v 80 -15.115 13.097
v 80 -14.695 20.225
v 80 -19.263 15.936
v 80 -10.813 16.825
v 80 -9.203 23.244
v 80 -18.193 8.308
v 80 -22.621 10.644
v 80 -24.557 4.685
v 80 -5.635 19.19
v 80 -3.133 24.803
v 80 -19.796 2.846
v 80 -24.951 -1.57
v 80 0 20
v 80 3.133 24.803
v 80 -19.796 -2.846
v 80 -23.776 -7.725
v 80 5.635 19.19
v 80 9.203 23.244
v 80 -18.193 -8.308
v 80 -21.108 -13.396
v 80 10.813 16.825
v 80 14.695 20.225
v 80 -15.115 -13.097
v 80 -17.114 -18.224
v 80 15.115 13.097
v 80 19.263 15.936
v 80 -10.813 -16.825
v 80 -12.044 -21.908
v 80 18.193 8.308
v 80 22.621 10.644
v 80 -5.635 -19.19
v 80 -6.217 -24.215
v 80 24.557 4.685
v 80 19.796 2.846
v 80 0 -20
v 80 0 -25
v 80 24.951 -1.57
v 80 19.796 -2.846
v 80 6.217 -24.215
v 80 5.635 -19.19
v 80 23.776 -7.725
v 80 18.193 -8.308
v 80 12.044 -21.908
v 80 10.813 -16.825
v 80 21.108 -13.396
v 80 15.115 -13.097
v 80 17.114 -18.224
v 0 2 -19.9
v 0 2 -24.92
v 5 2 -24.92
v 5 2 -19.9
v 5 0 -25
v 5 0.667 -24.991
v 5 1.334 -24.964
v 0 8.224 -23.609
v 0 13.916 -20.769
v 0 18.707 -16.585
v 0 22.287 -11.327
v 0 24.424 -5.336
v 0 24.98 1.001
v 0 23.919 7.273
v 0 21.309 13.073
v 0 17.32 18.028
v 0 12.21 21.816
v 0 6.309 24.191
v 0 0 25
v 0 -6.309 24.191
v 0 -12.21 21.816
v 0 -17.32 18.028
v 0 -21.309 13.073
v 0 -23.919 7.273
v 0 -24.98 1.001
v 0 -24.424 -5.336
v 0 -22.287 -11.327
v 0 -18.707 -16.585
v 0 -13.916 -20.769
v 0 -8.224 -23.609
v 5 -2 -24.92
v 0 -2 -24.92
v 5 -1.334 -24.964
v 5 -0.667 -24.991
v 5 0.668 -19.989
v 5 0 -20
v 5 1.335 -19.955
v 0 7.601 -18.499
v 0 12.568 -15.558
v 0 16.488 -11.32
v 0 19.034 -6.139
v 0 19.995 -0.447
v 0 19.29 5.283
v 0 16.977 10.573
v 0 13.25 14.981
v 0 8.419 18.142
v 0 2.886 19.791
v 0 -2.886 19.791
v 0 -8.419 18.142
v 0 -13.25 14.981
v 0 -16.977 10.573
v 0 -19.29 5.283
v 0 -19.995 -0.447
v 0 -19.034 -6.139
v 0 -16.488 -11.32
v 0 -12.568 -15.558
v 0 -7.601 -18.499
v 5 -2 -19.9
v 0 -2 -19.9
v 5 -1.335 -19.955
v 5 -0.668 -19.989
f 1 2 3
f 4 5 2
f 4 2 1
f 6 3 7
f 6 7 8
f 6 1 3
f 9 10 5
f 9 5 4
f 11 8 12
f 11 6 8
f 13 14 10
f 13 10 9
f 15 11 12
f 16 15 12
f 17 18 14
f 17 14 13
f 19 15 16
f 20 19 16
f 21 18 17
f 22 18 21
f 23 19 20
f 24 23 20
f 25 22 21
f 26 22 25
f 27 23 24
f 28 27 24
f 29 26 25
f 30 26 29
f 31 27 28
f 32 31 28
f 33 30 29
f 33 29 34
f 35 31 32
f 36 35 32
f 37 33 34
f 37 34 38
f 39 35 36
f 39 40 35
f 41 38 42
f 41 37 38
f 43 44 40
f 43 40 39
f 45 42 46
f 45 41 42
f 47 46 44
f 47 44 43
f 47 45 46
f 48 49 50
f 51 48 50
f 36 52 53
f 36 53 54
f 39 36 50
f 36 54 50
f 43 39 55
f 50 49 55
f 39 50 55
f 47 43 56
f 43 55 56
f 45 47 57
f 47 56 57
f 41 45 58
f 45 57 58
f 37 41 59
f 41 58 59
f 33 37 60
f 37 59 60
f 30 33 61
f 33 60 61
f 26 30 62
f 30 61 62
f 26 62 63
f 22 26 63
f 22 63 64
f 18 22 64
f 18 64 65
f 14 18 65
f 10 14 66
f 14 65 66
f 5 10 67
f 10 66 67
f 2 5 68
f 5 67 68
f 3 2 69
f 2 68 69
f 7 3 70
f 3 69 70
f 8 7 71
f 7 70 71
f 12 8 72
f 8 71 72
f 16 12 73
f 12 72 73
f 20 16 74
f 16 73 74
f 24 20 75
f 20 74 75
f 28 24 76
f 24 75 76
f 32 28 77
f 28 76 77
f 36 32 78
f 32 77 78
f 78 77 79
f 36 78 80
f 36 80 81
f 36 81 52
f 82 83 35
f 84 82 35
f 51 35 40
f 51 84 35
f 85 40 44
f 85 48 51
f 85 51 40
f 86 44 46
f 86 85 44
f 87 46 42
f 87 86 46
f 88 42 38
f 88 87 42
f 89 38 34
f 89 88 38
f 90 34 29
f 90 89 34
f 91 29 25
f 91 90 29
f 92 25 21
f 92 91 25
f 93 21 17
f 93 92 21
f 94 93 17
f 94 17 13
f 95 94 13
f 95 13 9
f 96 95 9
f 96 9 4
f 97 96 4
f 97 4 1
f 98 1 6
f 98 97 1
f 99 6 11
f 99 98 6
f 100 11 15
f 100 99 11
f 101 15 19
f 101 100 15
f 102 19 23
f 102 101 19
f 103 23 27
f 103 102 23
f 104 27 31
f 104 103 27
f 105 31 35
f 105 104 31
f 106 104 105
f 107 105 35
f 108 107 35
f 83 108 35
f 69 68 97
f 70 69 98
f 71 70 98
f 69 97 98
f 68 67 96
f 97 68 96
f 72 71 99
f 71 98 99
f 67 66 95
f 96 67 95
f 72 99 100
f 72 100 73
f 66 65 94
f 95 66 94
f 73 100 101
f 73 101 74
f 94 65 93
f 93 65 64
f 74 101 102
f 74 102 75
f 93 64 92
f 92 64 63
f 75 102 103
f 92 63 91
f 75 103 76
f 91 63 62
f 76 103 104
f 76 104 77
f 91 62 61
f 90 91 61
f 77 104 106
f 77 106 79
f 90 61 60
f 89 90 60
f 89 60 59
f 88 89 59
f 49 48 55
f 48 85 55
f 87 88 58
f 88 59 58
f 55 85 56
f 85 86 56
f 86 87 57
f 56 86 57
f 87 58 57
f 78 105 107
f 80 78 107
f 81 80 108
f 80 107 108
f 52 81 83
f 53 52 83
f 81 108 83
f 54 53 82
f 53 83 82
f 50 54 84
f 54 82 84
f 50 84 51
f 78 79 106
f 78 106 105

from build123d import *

# Parameters (mm, degrees)
SKETCH_1_R          = 25
SKETCH_1_R_2        = 20
EXTRUDE_1_DEPTH     = 80
SKETCH_2_W          = 5
SKETCH_2_H          = 4
CUT_EXTRUDE_1_DEPTH = 80


with BuildPart() as part:
    # Эскиз1 → Бобышка-Вытянуть1 (new body)
    with BuildSketch(Plane(origin=(0, 0, 0), x_dir=(0, 0, -1), z_dir=(1, 0, 0))):
        Circle(SKETCH_1_R)
        Circle(SKETCH_1_R_2, mode=Mode.SUBTRACT)
    extrude(amount=EXTRUDE_1_DEPTH)

    # Эскиз2 → Вырез-Вытянуть1 (cut)
    with BuildSketch(Plane.XY):
        with Locations((2.5, 0)):
            Rectangle(SKETCH_2_W, SKETCH_2_H)
    extrude(amount=-CUT_EXTRUDE_1_DEPTH, mode=Mode.SUBTRACT)


solid = part.part
